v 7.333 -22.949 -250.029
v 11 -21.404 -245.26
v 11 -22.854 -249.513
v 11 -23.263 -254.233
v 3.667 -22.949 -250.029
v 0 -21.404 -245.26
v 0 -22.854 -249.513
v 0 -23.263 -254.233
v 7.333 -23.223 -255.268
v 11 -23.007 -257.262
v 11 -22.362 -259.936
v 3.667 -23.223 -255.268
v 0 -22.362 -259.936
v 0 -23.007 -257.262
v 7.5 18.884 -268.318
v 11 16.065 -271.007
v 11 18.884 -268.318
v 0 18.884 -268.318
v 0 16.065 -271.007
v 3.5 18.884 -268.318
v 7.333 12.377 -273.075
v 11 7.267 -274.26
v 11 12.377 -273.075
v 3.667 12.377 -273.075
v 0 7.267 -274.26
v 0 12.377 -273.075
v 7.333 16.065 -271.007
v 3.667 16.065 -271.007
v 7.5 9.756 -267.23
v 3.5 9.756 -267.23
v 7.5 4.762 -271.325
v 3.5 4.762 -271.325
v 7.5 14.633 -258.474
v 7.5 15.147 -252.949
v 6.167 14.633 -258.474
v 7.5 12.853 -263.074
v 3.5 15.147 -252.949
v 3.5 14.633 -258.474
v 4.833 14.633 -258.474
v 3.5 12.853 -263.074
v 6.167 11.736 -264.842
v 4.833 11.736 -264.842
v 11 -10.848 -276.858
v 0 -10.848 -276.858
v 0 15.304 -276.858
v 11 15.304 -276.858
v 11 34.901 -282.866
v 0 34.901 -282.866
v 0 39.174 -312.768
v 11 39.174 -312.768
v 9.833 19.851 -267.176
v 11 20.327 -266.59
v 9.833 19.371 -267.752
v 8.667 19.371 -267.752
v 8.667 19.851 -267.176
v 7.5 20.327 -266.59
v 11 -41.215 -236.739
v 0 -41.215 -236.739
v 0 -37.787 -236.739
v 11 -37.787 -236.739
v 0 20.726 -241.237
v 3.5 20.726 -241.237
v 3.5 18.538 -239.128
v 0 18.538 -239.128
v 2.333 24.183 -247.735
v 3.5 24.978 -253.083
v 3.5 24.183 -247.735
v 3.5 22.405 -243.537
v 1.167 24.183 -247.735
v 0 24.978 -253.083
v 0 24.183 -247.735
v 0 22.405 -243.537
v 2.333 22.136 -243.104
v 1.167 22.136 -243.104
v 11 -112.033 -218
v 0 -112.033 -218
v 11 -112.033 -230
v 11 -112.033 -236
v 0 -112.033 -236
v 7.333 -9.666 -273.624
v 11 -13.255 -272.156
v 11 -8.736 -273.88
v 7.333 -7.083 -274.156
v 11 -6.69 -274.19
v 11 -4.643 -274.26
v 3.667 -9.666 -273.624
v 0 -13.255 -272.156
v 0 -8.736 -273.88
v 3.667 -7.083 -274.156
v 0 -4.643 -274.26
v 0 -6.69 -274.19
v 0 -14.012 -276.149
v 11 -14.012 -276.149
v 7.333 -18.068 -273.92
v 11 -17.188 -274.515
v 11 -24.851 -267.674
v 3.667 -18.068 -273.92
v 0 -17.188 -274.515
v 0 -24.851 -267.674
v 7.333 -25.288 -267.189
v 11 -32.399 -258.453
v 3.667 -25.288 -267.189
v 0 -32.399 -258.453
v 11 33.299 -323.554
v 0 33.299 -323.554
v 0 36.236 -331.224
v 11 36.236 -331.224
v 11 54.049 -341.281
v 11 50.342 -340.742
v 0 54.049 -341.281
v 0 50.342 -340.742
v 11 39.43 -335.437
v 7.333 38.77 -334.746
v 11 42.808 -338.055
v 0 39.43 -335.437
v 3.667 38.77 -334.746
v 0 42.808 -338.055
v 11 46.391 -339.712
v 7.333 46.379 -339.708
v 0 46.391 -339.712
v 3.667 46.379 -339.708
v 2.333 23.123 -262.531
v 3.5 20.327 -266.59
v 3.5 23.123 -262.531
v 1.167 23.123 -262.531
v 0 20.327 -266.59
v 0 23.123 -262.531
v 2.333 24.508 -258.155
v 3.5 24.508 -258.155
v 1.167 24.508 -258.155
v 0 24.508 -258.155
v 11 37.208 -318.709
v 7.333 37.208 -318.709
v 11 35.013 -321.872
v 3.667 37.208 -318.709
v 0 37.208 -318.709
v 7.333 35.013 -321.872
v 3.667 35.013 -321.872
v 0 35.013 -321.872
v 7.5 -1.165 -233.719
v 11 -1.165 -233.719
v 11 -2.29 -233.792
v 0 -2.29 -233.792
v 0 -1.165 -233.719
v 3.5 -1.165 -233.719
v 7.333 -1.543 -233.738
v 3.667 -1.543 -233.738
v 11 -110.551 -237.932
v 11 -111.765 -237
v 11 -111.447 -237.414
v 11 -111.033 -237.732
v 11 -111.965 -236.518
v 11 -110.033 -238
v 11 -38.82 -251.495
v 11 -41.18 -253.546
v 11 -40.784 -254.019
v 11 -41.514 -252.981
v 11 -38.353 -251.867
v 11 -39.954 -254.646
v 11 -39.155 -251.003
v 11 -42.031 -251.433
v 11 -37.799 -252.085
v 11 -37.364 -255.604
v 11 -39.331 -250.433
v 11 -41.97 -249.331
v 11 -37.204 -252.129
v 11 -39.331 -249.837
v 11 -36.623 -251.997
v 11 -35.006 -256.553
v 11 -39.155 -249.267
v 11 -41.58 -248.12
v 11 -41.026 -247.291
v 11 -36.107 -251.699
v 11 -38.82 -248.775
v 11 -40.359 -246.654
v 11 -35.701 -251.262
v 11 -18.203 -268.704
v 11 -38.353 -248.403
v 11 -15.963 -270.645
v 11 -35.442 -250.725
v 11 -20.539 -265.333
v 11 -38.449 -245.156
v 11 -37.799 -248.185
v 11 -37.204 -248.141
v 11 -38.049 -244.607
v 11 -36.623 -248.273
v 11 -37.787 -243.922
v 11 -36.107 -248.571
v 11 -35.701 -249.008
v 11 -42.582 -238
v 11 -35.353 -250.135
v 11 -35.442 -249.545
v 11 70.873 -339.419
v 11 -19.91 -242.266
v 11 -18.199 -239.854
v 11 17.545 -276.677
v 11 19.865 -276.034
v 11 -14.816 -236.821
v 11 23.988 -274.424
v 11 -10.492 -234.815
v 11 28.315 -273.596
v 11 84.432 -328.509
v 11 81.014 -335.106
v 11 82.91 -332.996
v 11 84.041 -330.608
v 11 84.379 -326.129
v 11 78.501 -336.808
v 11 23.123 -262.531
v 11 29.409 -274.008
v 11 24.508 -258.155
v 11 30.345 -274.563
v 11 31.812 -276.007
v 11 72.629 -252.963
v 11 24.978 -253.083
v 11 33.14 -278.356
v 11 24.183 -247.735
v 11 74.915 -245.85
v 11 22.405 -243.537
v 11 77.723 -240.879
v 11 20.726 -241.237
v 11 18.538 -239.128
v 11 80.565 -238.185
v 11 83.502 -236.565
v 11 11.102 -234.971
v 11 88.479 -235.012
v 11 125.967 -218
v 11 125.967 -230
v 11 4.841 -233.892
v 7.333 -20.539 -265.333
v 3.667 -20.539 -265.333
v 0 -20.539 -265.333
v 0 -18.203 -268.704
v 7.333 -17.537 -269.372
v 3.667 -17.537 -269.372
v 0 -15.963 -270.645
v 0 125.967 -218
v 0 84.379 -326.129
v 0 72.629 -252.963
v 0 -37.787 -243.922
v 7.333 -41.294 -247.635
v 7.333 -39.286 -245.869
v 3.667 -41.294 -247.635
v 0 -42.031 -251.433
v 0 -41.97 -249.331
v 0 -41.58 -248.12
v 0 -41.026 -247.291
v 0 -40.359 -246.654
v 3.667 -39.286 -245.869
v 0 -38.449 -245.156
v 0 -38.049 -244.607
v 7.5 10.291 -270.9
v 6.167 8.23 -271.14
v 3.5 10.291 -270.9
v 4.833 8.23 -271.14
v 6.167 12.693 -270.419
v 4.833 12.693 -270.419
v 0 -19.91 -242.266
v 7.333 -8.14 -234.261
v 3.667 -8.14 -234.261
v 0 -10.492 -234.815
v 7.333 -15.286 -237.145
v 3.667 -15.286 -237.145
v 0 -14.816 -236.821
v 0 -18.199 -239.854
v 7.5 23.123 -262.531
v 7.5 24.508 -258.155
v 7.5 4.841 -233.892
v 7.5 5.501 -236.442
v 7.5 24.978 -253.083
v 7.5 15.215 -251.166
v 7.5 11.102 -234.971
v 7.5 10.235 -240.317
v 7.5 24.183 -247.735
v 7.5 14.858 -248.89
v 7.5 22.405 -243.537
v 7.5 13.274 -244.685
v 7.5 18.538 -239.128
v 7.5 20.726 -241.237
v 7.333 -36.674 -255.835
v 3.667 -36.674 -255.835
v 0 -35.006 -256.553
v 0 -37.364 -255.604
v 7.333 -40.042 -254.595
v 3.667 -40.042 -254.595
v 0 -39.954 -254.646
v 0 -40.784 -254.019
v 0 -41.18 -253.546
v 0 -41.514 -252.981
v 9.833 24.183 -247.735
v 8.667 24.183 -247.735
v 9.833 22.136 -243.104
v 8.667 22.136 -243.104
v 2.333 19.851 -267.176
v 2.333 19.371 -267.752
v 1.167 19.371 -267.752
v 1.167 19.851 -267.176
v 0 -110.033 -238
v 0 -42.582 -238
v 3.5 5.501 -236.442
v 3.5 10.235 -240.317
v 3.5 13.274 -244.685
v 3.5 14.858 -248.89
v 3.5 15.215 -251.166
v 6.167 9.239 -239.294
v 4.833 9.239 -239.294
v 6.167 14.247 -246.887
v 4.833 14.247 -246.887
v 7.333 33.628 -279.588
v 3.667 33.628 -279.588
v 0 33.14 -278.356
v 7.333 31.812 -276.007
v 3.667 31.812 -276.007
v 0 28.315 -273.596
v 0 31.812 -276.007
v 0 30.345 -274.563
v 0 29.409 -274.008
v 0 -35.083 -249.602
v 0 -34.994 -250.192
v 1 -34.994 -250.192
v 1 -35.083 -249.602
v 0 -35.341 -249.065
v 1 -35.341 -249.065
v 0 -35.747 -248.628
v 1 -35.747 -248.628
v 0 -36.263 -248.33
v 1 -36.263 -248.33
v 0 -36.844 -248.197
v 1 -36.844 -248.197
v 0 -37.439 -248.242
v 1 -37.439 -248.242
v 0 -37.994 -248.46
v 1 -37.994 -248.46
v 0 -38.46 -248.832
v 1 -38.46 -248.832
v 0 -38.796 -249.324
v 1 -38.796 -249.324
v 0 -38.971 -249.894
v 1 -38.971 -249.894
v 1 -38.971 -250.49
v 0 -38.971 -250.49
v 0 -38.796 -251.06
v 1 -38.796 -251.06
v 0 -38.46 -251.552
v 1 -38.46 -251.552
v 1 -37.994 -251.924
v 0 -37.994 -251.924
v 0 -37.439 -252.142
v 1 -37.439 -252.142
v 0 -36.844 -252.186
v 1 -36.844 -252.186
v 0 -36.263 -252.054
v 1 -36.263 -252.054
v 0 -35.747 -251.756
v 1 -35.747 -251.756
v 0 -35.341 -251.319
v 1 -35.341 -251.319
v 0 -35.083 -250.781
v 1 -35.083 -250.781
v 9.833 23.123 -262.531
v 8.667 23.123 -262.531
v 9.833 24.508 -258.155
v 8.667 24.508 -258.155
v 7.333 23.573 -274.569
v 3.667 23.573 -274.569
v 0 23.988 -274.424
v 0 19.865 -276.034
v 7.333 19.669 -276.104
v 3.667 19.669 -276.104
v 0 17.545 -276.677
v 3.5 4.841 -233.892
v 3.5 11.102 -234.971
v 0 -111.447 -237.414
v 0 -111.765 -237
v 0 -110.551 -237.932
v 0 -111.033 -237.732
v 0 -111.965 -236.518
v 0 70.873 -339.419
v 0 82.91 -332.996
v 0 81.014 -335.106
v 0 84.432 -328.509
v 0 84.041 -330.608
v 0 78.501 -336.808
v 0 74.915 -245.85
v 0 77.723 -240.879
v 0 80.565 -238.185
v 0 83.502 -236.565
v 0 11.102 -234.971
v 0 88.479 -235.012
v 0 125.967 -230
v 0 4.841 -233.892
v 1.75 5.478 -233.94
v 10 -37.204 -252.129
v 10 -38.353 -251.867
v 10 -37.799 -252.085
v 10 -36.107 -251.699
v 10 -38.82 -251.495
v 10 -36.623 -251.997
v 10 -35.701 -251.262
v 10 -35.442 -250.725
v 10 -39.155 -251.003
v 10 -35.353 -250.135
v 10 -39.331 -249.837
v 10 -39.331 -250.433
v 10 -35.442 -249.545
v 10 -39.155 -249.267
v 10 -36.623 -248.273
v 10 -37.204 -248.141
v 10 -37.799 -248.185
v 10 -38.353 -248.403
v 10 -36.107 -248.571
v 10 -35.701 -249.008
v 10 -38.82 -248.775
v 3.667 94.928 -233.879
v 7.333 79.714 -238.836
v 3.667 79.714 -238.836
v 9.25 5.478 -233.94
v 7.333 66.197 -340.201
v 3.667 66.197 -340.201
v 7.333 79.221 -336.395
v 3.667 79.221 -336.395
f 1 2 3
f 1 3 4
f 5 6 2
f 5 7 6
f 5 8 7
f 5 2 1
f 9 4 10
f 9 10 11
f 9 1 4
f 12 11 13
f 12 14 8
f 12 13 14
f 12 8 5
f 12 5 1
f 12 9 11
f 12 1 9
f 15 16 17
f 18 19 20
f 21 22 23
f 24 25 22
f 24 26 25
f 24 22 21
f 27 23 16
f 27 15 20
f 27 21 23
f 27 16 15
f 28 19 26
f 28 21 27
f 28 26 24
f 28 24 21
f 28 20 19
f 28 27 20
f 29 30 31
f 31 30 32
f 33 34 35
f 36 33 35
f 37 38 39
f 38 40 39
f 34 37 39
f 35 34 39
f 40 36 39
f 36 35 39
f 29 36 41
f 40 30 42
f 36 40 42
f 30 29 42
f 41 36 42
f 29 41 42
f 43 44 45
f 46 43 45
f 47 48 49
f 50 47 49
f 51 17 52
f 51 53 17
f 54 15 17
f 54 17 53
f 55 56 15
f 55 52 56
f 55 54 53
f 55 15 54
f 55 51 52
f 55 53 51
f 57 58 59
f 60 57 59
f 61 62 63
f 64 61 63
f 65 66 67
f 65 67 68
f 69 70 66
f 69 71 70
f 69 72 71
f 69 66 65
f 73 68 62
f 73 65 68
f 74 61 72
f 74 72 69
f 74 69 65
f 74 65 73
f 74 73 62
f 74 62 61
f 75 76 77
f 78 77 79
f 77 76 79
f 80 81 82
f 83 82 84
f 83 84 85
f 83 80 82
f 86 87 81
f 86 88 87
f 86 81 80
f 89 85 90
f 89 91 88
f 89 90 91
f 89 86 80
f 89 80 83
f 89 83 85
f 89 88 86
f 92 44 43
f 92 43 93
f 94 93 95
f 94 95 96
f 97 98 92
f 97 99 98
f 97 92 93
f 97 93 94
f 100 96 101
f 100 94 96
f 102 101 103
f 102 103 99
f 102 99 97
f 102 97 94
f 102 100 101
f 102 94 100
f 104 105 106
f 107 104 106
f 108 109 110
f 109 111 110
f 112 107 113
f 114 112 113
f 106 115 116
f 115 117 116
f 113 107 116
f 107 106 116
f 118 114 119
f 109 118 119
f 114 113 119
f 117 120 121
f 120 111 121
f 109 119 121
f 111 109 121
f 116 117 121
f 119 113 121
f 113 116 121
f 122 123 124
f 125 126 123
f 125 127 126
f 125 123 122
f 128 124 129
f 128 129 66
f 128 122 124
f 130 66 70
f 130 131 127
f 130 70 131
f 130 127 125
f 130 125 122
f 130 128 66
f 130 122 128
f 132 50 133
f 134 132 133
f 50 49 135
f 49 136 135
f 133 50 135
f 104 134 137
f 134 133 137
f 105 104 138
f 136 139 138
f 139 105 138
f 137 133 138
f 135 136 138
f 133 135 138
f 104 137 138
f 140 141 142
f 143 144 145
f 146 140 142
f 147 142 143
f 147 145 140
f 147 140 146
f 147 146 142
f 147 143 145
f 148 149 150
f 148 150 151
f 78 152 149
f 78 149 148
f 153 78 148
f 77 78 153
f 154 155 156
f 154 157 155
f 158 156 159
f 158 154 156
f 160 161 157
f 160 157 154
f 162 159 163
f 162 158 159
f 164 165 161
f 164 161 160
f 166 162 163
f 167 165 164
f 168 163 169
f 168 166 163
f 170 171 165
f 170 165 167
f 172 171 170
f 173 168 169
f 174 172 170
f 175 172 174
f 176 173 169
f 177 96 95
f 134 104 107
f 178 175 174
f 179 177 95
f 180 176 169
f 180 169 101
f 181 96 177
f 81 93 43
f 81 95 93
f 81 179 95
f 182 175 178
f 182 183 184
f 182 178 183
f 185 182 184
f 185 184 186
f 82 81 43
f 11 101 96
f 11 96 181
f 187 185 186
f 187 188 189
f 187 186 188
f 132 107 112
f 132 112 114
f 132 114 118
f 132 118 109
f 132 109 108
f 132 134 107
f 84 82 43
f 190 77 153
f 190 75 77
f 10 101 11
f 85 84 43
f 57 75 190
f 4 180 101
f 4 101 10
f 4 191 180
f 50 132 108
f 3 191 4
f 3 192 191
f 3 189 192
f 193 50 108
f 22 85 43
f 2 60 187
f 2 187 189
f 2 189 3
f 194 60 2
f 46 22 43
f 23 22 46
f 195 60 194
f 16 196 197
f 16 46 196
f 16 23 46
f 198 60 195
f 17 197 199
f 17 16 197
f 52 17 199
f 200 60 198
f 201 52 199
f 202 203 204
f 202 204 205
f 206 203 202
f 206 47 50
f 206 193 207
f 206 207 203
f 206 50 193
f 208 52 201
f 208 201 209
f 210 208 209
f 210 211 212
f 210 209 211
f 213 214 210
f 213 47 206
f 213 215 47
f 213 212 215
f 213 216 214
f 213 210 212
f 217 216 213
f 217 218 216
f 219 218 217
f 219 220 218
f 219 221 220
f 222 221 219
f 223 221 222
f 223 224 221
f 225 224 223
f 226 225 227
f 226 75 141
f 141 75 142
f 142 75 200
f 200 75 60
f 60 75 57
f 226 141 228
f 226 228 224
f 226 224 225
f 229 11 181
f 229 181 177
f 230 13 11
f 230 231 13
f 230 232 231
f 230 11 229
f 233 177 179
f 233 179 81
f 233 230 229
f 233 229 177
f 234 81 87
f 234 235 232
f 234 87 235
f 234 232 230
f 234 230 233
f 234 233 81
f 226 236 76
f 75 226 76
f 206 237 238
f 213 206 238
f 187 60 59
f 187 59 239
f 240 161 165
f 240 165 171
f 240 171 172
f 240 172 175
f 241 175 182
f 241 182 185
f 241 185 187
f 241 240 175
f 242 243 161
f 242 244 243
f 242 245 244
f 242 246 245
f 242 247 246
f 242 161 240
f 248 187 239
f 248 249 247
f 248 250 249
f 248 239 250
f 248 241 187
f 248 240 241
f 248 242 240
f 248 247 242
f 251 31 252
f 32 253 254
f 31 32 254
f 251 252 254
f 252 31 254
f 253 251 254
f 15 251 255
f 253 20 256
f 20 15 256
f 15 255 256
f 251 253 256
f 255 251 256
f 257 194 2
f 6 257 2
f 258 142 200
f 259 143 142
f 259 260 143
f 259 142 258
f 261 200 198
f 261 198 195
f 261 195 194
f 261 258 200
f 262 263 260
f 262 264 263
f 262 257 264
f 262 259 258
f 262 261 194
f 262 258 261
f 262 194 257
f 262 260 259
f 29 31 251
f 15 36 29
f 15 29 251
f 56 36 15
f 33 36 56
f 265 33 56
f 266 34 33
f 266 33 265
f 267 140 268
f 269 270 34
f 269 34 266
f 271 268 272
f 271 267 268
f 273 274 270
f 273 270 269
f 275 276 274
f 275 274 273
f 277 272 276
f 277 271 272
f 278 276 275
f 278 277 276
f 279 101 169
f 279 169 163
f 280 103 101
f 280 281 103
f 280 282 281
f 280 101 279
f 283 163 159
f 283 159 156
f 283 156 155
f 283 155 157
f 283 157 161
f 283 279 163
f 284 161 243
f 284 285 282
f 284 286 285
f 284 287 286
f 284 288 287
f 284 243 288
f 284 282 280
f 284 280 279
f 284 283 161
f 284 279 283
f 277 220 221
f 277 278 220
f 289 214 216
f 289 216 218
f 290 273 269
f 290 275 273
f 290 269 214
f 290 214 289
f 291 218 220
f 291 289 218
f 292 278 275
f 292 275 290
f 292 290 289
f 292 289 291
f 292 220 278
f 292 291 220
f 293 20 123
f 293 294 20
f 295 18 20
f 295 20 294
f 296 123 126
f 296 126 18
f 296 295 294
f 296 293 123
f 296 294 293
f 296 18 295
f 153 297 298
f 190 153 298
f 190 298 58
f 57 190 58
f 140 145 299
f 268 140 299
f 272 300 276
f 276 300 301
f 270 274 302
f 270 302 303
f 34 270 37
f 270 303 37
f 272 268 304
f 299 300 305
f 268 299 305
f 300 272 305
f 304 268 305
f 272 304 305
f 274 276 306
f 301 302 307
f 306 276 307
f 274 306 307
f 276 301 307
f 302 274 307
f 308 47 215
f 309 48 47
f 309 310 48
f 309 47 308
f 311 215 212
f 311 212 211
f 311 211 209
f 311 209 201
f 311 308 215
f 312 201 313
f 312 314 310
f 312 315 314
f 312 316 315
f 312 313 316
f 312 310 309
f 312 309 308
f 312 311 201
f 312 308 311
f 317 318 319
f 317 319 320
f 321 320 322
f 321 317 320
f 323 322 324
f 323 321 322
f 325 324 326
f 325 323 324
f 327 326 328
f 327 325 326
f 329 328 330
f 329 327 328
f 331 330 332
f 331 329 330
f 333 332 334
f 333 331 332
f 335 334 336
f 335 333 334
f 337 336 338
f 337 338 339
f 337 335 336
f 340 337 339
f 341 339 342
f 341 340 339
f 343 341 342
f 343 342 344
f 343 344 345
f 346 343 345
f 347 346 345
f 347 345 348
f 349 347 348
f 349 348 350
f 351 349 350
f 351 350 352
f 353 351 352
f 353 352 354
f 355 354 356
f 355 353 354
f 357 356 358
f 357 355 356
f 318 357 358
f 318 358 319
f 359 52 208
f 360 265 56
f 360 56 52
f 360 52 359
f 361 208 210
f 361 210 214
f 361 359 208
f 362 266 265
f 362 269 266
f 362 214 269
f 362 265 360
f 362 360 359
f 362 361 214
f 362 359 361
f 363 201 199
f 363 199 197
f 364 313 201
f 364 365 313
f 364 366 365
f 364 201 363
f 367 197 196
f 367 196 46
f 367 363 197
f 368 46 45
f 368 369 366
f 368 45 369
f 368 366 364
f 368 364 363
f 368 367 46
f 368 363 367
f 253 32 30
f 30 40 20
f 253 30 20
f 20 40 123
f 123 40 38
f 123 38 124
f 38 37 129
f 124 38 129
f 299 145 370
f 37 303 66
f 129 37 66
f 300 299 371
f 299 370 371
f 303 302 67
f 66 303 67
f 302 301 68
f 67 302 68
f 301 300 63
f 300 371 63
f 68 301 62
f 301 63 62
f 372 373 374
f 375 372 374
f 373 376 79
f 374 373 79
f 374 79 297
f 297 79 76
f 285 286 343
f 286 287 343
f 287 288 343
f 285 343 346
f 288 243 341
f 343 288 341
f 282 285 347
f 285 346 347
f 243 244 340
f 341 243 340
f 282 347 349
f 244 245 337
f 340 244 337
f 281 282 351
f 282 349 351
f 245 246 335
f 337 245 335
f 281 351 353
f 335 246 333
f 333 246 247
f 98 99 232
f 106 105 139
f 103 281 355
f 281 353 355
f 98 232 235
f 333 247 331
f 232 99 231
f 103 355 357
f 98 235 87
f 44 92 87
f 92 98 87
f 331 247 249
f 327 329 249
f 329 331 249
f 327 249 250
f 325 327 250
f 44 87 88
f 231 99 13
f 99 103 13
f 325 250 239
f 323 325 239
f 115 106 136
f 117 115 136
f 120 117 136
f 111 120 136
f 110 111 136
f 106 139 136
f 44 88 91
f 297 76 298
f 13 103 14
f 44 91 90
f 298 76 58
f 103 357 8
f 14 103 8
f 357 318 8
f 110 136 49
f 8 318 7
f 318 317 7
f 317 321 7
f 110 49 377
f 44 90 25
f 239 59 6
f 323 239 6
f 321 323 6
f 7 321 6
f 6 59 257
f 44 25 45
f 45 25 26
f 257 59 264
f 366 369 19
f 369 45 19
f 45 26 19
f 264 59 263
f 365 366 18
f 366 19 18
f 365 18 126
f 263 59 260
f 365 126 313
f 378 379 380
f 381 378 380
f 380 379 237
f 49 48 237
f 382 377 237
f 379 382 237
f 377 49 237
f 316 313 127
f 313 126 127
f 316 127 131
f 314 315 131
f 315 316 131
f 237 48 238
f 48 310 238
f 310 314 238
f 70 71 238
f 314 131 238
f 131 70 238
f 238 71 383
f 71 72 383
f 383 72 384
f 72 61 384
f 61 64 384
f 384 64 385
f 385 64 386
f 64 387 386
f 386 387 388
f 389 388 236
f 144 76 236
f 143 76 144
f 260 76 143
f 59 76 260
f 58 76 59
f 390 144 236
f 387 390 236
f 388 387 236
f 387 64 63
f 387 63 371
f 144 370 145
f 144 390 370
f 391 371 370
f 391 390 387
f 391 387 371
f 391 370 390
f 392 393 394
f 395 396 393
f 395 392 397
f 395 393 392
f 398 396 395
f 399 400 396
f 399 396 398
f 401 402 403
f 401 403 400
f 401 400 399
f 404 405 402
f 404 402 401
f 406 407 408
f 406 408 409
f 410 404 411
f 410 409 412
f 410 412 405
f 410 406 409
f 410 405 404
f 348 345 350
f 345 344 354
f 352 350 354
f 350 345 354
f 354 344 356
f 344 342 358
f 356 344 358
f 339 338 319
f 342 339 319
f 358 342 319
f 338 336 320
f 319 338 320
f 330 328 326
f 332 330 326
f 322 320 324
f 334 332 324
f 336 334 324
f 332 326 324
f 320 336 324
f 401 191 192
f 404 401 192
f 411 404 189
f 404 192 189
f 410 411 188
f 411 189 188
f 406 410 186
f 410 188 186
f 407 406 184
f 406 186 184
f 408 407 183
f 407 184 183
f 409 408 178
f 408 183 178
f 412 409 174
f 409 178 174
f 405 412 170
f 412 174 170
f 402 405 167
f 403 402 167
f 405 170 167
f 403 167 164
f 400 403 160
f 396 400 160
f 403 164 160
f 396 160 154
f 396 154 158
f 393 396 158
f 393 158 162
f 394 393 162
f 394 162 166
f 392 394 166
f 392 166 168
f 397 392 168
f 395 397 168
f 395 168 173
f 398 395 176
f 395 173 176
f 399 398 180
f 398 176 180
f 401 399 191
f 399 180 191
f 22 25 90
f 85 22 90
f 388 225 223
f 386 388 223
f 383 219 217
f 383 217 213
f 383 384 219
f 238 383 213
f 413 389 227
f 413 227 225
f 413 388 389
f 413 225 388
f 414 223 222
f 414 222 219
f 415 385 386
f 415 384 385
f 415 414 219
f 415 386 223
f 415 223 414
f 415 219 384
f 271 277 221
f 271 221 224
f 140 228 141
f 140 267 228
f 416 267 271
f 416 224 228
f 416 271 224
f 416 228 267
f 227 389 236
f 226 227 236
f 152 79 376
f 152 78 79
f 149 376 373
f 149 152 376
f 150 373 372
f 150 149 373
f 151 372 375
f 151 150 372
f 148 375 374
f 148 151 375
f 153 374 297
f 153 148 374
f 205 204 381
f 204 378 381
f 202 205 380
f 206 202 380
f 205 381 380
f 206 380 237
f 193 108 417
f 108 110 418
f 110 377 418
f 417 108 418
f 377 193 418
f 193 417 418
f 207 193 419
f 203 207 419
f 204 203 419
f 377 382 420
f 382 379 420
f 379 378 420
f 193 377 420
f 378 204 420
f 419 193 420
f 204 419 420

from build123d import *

# Parameters (mm, degrees)
F0_W     = 69.4504092897
F0_H     = 8
F1_DEPTH = 11
F2_DEPTH = 7.5
F3_DEPTH = 3.5
F4_R     = 2
F5_DEPTH = 1
F6_R     = 2
F7_DEPTH = 1
F8_R     = 2


with BuildPart() as f1:
    # F0 (on Right) → F1 (new body)
    with BuildSketch(Plane.YZ):
        Polygon((125.9671086108, -218), (0, -218), (0, -230), (119.9886596101, -230), (125.9671086108, -230), align=None)
        Polygon((0, -230), (0, -218), (-112.0328913892, -218), (-112.0328913892, -230), (-42.5824820995, -230), align=None)
        with BuildLine():
            Line((119.9886596101, -230), (0, -230))
            Line((0, -230), (-42.5824820995, -230))
            Line((-42.5824820995, -230), (-42.5824820995, -238))
            Line((-42.5824820995, -238), (-41.2151366472, -236.7386668921))
            Line((-41.2151366472, -236.7386668921), (-37.7865731716, -236.7386668921))
            Line((-37.7865731716, -236.7386668921), (-37.7865731716, -243.9223229885))
            add(Edge.make_bspline(
                [(-42.0314595103, -251.4325082302), (-42.5212569535, -245.88149786), (-38.4396314621, -246.6978281736), (-37.7865731716, -243.9223229885)],
                knots=[0, 0, 0, 0, 8.62681531, 8.62681531, 8.62681531, 8.62681531], degree=3))
            add(Edge.make_bspline(
                [(-32.398827374, -258.4528923035), (-36.9702465832, -254.0447413921), (-40.8886037767, -256.6569745541), (-42.0314595103, -251.4325082302)],
                knots=[0, 0, 0, 0, 11.919454451, 11.919454451, 11.919454451, 11.919454451], degree=3))
            add(Edge.make_bspline(
                [(-10.8478534967, -276.8577933311), (-18.0315114558, -276.4120399952), (-25.3784339875, -267.5957381725), (-32.398827374, -258.4528923035)],
                knots=[0, 0, 0, 0, 28.3405161721, 28.3405161721, 28.3405161721, 28.3405161721], degree=3))
            Line((-10.8478534967, -276.8577933311), (15.3035437688, -276.8577933311))
            add(Edge.make_bspline(
                [(28.3146612346, -273.5956013203), (22.7218363434, -273.8401889801), (20.3328952193, -276.941627264), (15.3035437688, -276.8577933311)],
                knots=[0, 0, 0, 0, 13.4138389145, 13.4138389145, 13.4138389145, 13.4138389145], degree=3))
            add(Edge.make_bspline(
                [(34.9013535306, -282.8655987978), (33.5207916796, -280.2323997021), (33.0320037901, -274.9298810959), (28.3146612346, -273.5956013203)],
                knots=[0, 0, 0, 0, 11.3717794841, 11.3717794841, 11.3717794841, 11.3717794841], degree=3))
            Line((34.9013535306, -282.8655987978), (30.6285899132, -252.9632747173))
            Line((30.6285899132, -252.9632747173), (72.6285899132, -252.9632747173))
            add(Edge.make_bspline(
                [(125.9671086108, -230), (84.4510868192, -236.0368669033), (78.2147446722, -231.554299593), (72.6285899132, -252.9632747173)],
                knots=[0, 0, 0, 0, 58.0715899782, 58.0715899782, 58.0715899782, 58.0715899782], degree=3))
            Line((125.9671086108, -230), (119.9886596101, -230))
        make_face()
        with BuildLine():
            add(Edge.make_bspline(
                [(-2.2899068426, -233.791783452), (-6.7162262276, -233.9929789305), (-16.5748465806, -233.5905879736), (-21.4035585523, -245.2599704266)],
                knots=[0, 0, 0, 0, 22.2901546464, 22.2901546464, 22.2901546464, 22.2901546464], degree=3))
            add(Edge.make_bspline(
                [(-1.1649398204, -233.7192680463), (-1.5450471165, -233.73570765), (-1.920463643, -233.7595033317), (-2.2899068426, -233.791783452)],
                knots=[0.9357244438, 0.9357244438, 0.9357244438, 0.9357244438, 1, 1, 1, 1], degree=3))
            add(Edge.make_bspline(
                [(18.53771694, -239.1283065081), (12.2761912644, -234.5663458109), (6.8953128785, -233.9907415129), (0.97691075, -233.6266332169), (-1.1649398204, -233.7192680463)],
                knots=[0, 0, 0, 0, 0.5735408235, 0.9357244438, 0.9357244438, 0.9357244438, 0.9357244438], degree=3))
            add(Edge.make_bspline(
                [(24.9781440943, -253.0825734138), (24.7097946703, -247.3577409983), (23.0102371424, -242.7957803011), (18.53771694, -239.1283065081)],
                knots=[0, 0, 0, 0, 15.3688212563, 15.3688212563, 15.3688212563, 15.3688212563], degree=3))
            add(Edge.make_bspline(
                [(20.3267261386, -266.5895819664), (23.9941906184, -262.5643014908), (24.7992426157, -258.628487587), (24.9781440943, -253.0825734138)],
                knots=[0, 0, 0, 0, 14.2854810573, 14.2854810573, 14.2854810573, 14.2854810573], degree=3))
            add(Edge.make_bspline(
                [(18.8836723567, -268.3176113068), (19.3763812768, -267.758725569), (19.8515536715, -267.1799487583), (20.3267261386, -266.5895819664)],
                knots=[12.7076946491, 12.7076946491, 12.7076946491, 12.7076946491, 15.1457642124, 15.1457642124, 15.1457642124, 15.1457642124], degree=3))
            add(Edge.make_bspline(
                [(7.2669684887, -274.2601037025), (13.2710677225, -273.603274134), (16.3155772532, -271.2306329063), (18.8836723567, -268.3176113068)],
                knots=[0, 0, 0, 0, 12.7076946491, 12.7076946491, 12.7076946491, 12.7076946491], degree=3))
            Line((7.2669684887, -274.2601037025), (-4.6425154433, -274.2601037025))
            add(Edge.make_bspline(
                [(-13.254606165, -272.155880928), (-8.8760508224, -274.2601037025), (-7.2994241491, -274.2016911507), (-4.6425154433, -274.2601037025)],
                knots=[0, 0, 0, 0, 8.8654306203, 8.8654306203, 8.8654306203, 8.8654306203], degree=3))
            add(Edge.make_bspline(
                [(-22.3616603762, -259.9363029003), (-21.093590185, -266.046077013), (-18.2116106153, -269.9655890465), (-13.254606165, -272.155880928)],
                knots=[0, 0, 0, 0, 15.2399646844, 15.2399646844, 15.2399646844, 15.2399646844], degree=3))
            add(Edge.make_bspline(
                [(-21.4035585523, -245.2599704266), (-23.62973243, -249.4458854198), (-23.7450096756, -255.9015154839), (-22.3616603762, -259.9363029003)],
                knots=[0, 0, 0, 0, 14.7075726748, 14.7075726748, 14.7075726748, 14.7075726748], degree=3))
        make_face(mode=Mode.SUBTRACT)
        with Locations((-77.3076867444, -234)):
            Rectangle(F0_W, F0_H)
        with BuildLine():
            Line((84.3787366599, -326.129257679), (72.6285899132, -252.9632747173))
            Line((72.6285899132, -252.9632747173), (30.6285899132, -252.9632747173))
            Line((30.6285899132, -252.9632747173), (34.9013535306, -282.8655987978))
            Line((34.9013535306, -282.8655987978), (39.1741171479, -312.7679228783))
            add(Edge.make_bspline(
                [(39.1741171479, -312.7679228783), (37.5588834286, -320.5303251743), (34.5356166363, -322.179377079), (33.2988277078, -323.5535919666)],
                knots=[0, 0, 0, 0, 12.2820879206, 12.2820879206, 12.2820879206, 12.2820879206], degree=3))
            add(Edge.make_bspline(
                [(33.2988277078, -323.5535919666), (37.0091982186, -338.8073444366), (47.0409430563, -340.4563963413), (54.0494211018, -341.2809073925)],
                knots=[0, 0, 0, 0, 27.2918456396, 27.2918456396, 27.2918456396, 27.2918456396], degree=3))
            add(Edge.make_bspline(
                [(54.0494211018, -341.2809073925), (62.8443732858, -340.3189778328), (86.0685482621, -340.8686518669), (84.3787366599, -326.129257679)],
                knots=[0, 0, 0, 0, 33.9033902621, 33.9033902621, 33.9033902621, 33.9033902621], degree=3))
        make_face()
    extrude(amount=F1_DEPTH)

    # F0 (on Right) → F2 (join)
    with BuildSketch(Plane.YZ):
        with BuildLine():
            add(Edge.make_bspline(
                [(18.53771694, -239.1283065081), (12.2761912644, -234.5663458109), (6.8953128785, -233.9907415129), (0.97691075, -233.6266332169), (-1.1649398204, -233.7192680463)],
                knots=[0, 0, 0, 0, 0.5735408235, 0.9357244438, 0.9357244438, 0.9357244438, 0.9357244438], degree=3))
            add(Edge.make_bspline(
                [(-1.1649398204, -233.7192680463), (12.3649053276, -237.1022552252), (15.8728584647, -248.8357573748), (15.1470759884, -252.9485225677)],
                knots=[0, 0, 0, 0, 25.215988761, 25.215988761, 25.215988761, 25.215988761], degree=3))
            add(Edge.make_bspline(
                [(15.1470759884, -252.9485225677), (15.2591429651, -257.8095793724), (14.3406344578, -265.0264501572), (4.7619077377, -271.3247835636)],
                knots=[0, 0, 0, 0, 21.107787373, 21.107787373, 21.107787373, 21.107787373], degree=3))
            add(Edge.make_bspline(
                [(4.7619077377, -271.3247835636), (7.9766856506, -271.1279392242), (11.5851107985, -271.3903784752), (18.8836723567, -268.3176113068)],
                knots=[0, 0, 0, 0, 14.4383974504, 14.4383974504, 14.4383974504, 14.4383974504], degree=3))
            add(Edge.make_bspline(
                [(18.8836723567, -268.3176113068), (19.3763812768, -267.758725569), (19.8515536715, -267.1799487583), (20.3267261386, -266.5895819664)],
                knots=[12.7076946491, 12.7076946491, 12.7076946491, 12.7076946491, 15.1457642124, 15.1457642124, 15.1457642124, 15.1457642124], degree=3))
            add(Edge.make_bspline(
                [(20.3267261386, -266.5895819664), (23.9941906184, -262.5643014908), (24.7992426157, -258.628487587), (24.9781440943, -253.0825734138)],
                knots=[0, 0, 0, 0, 14.2854810573, 14.2854810573, 14.2854810573, 14.2854810573], degree=3))
            add(Edge.make_bspline(
                [(24.9781440943, -253.0825734138), (24.7097946703, -247.3577409983), (23.0102371424, -242.7957803011), (18.53771694, -239.1283065081)],
                knots=[0, 0, 0, 0, 15.3688212563, 15.3688212563, 15.3688212563, 15.3688212563], degree=3))
        make_face()
    extrude(amount=F2_DEPTH)

    # F0 (on Right) → F3 (cut)
    with BuildSketch(Plane.YZ):
        with BuildLine():
            add(Edge.make_bspline(
                [(18.53771694, -239.1283065081), (12.2761912644, -234.5663458109), (6.8953128785, -233.9907415129), (0.97691075, -233.6266332169), (-1.1649398204, -233.7192680463)],
                knots=[0, 0, 0, 0, 0.5735408235, 0.9357244438, 0.9357244438, 0.9357244438, 0.9357244438], degree=3))
            add(Edge.make_bspline(
                [(-1.1649398204, -233.7192680463), (12.3649053276, -237.1022552252), (15.8728584647, -248.8357573748), (15.1470759884, -252.9485225677)],
                knots=[0, 0, 0, 0, 25.215988761, 25.215988761, 25.215988761, 25.215988761], degree=3))
            add(Edge.make_bspline(
                [(15.1470759884, -252.9485225677), (15.2591429651, -257.8095793724), (14.3406344578, -265.0264501572), (4.7619077377, -271.3247835636)],
                knots=[0, 0, 0, 0, 21.107787373, 21.107787373, 21.107787373, 21.107787373], degree=3))
            add(Edge.make_bspline(
                [(4.7619077377, -271.3247835636), (7.9766856506, -271.1279392242), (11.5851107985, -271.3903784752), (18.8836723567, -268.3176113068)],
                knots=[0, 0, 0, 0, 14.4383974504, 14.4383974504, 14.4383974504, 14.4383974504], degree=3))
            add(Edge.make_bspline(
                [(18.8836723567, -268.3176113068), (19.3763812768, -267.758725569), (19.8515536715, -267.1799487583), (20.3267261386, -266.5895819664)],
                knots=[12.7076946491, 12.7076946491, 12.7076946491, 12.7076946491, 15.1457642124, 15.1457642124, 15.1457642124, 15.1457642124], degree=3))
            add(Edge.make_bspline(
                [(20.3267261386, -266.5895819664), (23.9941906184, -262.5643014908), (24.7992426157, -258.628487587), (24.9781440943, -253.0825734138)],
                knots=[0, 0, 0, 0, 14.2854810573, 14.2854810573, 14.2854810573, 14.2854810573], degree=3))
            add(Edge.make_bspline(
                [(24.9781440943, -253.0825734138), (24.7097946703, -247.3577409983), (23.0102371424, -242.7957803011), (18.53771694, -239.1283065081)],
                knots=[0, 0, 0, 0, 15.3688212563, 15.3688212563, 15.3688212563, 15.3688212563], degree=3))
        make_face()
    extrude(amount=F3_DEPTH, mode=Mode.SUBTRACT)

    # F4 (on face) → F5 (cut)
    with BuildSketch(Plane.YZ.offset(11)):
        with Locations((-37.3534969985, -250.1350045204)):
            Circle(F4_R)
    extrude(amount=-F5_DEPTH, mode=Mode.SUBTRACT)

    # F6 (on face) → F7 (cut)
    with BuildSketch(Plane.YZ):
        with Locations((-36.9937494397, -250.1918673515)):
            Circle(F6_R)
    extrude(amount=F7_DEPTH, mode=Mode.SUBTRACT)

    # F8
    f8_edges = [f1.edges().sort_by_distance(p)[0] for p in [
        (5.5, -112.032891, -238),
    ]]
    fillet(f8_edges, radius=F8_R)


solid = f1.part
